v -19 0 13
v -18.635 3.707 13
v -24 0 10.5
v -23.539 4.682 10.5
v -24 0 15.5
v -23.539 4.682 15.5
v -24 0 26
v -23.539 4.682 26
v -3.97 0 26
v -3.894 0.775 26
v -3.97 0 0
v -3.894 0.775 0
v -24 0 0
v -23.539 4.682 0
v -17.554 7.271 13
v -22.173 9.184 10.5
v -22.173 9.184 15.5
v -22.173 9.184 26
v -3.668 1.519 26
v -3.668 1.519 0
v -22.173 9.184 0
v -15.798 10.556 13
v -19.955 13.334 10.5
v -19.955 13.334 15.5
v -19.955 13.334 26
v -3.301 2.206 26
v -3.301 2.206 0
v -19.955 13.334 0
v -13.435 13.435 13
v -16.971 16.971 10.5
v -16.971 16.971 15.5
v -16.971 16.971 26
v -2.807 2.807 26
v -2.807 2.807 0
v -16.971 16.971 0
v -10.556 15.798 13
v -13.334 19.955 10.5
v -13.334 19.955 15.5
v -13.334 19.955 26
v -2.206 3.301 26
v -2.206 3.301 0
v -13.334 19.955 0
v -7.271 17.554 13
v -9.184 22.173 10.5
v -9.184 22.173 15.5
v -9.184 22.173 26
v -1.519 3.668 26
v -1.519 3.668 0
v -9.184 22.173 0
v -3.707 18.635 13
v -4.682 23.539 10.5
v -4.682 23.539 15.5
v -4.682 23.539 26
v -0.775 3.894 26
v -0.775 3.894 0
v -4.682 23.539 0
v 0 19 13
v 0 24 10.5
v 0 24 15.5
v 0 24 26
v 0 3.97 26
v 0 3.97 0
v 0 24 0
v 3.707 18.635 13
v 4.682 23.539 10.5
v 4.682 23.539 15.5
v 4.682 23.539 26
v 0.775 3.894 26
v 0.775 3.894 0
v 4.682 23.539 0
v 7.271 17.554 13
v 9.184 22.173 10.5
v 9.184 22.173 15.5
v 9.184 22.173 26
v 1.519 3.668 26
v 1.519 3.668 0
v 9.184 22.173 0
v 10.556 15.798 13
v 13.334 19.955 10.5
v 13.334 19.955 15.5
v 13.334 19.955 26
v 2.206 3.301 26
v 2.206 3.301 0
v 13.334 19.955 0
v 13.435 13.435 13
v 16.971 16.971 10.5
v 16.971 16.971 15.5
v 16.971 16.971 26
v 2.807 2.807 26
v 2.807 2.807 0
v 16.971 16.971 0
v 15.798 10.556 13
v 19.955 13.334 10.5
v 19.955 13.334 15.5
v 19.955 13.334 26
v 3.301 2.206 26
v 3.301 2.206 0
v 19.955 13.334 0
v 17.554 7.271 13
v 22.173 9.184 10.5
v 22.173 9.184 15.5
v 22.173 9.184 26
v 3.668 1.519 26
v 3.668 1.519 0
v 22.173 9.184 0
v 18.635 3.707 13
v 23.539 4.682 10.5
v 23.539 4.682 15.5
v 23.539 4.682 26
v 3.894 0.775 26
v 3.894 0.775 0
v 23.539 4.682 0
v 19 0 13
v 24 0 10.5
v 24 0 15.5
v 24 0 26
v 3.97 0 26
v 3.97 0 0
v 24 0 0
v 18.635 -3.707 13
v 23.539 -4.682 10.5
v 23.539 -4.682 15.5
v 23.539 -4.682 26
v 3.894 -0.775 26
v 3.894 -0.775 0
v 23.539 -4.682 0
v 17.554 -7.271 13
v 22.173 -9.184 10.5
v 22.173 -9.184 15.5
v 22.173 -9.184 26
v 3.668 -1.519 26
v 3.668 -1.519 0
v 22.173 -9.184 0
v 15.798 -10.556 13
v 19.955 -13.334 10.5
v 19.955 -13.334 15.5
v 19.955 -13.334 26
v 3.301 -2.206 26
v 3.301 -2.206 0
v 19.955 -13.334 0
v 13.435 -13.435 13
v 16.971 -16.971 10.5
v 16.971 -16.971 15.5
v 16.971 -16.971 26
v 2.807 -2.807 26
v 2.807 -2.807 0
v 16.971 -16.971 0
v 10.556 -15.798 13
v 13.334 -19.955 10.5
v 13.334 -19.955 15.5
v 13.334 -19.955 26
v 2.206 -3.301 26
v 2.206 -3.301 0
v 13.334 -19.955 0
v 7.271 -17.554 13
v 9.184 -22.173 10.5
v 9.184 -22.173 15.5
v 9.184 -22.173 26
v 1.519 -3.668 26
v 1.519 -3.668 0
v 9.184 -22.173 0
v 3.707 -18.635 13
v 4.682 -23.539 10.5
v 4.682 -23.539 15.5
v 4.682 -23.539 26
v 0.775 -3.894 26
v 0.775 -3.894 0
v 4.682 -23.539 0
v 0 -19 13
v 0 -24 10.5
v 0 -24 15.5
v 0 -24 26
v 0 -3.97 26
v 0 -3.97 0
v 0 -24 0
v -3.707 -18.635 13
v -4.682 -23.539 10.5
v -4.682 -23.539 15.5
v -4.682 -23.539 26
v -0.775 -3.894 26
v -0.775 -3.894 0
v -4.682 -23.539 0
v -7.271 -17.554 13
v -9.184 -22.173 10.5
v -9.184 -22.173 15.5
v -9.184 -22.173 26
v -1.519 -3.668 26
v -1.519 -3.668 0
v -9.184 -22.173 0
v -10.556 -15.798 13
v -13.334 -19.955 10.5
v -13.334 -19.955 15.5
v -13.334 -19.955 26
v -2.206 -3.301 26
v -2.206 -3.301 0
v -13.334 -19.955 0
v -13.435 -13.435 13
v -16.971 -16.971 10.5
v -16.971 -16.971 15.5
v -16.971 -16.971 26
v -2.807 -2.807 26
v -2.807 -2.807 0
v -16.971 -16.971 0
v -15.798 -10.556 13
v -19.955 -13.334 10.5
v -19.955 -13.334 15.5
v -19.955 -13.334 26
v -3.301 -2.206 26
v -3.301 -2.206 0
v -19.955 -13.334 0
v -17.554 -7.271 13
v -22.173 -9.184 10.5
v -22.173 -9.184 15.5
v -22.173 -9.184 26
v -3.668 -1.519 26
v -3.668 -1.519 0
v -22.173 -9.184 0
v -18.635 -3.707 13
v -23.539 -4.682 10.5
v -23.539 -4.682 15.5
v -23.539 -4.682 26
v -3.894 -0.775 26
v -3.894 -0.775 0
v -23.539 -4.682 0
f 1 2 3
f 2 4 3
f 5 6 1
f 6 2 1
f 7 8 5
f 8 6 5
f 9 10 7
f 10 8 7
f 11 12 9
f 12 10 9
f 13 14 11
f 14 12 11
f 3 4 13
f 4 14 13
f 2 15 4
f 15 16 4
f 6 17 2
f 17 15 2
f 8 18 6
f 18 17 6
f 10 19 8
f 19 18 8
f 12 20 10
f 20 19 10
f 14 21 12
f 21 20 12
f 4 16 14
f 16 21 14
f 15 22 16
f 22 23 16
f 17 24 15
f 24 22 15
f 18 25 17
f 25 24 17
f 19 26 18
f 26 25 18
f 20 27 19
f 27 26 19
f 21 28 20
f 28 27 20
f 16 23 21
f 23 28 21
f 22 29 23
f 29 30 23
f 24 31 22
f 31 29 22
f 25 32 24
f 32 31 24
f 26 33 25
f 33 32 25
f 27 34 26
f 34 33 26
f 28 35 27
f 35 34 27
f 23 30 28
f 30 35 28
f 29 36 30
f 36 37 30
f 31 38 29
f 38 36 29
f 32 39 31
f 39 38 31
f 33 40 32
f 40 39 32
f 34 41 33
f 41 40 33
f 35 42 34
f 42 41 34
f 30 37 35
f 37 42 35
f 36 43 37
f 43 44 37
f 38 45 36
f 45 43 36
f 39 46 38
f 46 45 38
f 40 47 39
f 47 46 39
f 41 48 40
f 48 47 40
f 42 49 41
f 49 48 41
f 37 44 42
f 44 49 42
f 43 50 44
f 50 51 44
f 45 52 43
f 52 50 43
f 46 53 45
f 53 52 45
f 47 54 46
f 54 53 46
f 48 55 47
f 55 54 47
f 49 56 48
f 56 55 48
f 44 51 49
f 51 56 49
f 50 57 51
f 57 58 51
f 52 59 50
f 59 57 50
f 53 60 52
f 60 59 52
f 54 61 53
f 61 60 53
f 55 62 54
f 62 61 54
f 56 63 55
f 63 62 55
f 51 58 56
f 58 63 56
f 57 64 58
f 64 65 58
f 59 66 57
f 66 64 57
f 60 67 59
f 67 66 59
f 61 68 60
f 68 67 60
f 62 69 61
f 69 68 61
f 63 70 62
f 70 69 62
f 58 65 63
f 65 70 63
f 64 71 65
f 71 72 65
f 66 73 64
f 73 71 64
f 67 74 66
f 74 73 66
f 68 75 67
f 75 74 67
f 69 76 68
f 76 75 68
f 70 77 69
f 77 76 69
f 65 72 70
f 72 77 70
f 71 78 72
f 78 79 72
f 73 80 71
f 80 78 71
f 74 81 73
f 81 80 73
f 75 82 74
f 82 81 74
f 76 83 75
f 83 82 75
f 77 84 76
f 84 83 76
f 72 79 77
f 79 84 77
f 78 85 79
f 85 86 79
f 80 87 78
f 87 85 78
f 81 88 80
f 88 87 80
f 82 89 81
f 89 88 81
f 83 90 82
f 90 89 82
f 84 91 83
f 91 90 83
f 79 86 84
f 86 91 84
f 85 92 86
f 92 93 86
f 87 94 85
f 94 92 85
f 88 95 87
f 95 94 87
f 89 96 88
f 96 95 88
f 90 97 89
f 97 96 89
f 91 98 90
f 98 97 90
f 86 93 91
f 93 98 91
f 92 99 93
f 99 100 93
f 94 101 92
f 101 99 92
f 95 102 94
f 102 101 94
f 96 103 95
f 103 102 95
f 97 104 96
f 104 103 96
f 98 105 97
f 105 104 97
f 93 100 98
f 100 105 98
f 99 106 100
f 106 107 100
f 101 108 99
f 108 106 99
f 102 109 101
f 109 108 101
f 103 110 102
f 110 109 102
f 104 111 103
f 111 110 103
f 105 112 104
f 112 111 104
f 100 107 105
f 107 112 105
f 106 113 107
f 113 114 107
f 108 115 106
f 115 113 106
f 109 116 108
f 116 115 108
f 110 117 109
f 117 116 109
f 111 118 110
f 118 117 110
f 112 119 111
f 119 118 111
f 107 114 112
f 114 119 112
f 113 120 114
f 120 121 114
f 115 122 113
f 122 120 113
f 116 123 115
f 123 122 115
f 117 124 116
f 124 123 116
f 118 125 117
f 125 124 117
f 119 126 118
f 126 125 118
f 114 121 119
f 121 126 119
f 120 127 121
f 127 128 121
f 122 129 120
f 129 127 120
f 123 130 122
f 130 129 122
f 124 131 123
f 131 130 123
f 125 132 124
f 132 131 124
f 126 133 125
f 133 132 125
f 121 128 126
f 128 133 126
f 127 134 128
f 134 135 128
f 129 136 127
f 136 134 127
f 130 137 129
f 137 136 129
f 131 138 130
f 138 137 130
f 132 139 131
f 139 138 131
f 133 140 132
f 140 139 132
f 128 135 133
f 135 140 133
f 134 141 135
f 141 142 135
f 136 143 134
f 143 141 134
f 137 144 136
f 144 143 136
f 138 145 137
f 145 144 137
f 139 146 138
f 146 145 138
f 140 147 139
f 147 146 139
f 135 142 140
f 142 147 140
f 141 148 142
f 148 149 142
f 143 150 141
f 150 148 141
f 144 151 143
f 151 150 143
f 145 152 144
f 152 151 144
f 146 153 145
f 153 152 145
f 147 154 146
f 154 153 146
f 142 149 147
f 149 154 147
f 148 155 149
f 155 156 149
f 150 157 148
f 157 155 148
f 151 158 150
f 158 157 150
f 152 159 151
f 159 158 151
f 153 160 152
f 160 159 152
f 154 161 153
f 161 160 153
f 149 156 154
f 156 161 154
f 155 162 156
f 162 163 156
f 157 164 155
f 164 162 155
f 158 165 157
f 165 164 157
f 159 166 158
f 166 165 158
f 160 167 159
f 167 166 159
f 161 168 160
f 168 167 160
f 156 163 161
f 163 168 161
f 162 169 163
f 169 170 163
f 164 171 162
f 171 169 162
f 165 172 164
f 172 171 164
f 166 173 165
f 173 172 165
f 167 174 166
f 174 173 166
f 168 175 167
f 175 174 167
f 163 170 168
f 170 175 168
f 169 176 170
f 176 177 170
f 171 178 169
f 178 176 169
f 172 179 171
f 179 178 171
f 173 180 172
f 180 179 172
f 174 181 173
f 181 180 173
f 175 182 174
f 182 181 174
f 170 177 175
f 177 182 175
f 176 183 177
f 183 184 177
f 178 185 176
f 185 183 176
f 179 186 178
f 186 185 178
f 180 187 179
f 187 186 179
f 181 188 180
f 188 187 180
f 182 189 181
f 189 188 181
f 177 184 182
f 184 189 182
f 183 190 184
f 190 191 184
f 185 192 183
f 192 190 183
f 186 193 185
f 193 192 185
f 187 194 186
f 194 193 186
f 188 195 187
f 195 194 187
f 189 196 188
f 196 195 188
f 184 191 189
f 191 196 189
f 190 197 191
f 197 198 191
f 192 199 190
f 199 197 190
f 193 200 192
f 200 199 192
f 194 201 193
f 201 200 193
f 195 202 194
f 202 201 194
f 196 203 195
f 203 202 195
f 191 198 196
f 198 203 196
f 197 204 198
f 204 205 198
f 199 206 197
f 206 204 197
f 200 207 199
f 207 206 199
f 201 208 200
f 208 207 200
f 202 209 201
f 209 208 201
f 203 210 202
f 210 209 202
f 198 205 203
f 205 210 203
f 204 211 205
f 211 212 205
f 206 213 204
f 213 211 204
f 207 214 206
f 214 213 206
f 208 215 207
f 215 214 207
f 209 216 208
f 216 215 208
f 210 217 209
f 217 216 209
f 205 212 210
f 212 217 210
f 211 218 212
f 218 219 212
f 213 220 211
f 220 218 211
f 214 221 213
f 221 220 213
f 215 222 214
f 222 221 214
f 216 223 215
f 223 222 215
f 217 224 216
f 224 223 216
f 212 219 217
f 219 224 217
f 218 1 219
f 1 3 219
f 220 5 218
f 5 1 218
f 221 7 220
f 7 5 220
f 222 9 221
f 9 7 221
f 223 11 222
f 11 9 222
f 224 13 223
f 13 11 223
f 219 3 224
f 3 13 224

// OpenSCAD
$fn = 32;

// ----------------------------------------------------------------------
// Belt roller: 48 mm barrel, 26 mm wide, bore 7.94 mm
// ----------------------------------------------------------------------

// --- parameters (mm) ---
bore_d = 7.94;            // bore
barrel_d = 48;            // barrel diameter
roller_w = 26;            // roller width
groove_w = 5;             // guide groove width
groove_d = 5;             // guide groove depth

roller_profile = [[3.97, 0], [24, 0], [24, 10.5], [19, 13], [24, 15.5], [24, 26], [3.97, 26]];

/* the profile stays clear of the axis, so the bore comes out of the revolve */
rotate_extrude() polygon(roller_profile);
